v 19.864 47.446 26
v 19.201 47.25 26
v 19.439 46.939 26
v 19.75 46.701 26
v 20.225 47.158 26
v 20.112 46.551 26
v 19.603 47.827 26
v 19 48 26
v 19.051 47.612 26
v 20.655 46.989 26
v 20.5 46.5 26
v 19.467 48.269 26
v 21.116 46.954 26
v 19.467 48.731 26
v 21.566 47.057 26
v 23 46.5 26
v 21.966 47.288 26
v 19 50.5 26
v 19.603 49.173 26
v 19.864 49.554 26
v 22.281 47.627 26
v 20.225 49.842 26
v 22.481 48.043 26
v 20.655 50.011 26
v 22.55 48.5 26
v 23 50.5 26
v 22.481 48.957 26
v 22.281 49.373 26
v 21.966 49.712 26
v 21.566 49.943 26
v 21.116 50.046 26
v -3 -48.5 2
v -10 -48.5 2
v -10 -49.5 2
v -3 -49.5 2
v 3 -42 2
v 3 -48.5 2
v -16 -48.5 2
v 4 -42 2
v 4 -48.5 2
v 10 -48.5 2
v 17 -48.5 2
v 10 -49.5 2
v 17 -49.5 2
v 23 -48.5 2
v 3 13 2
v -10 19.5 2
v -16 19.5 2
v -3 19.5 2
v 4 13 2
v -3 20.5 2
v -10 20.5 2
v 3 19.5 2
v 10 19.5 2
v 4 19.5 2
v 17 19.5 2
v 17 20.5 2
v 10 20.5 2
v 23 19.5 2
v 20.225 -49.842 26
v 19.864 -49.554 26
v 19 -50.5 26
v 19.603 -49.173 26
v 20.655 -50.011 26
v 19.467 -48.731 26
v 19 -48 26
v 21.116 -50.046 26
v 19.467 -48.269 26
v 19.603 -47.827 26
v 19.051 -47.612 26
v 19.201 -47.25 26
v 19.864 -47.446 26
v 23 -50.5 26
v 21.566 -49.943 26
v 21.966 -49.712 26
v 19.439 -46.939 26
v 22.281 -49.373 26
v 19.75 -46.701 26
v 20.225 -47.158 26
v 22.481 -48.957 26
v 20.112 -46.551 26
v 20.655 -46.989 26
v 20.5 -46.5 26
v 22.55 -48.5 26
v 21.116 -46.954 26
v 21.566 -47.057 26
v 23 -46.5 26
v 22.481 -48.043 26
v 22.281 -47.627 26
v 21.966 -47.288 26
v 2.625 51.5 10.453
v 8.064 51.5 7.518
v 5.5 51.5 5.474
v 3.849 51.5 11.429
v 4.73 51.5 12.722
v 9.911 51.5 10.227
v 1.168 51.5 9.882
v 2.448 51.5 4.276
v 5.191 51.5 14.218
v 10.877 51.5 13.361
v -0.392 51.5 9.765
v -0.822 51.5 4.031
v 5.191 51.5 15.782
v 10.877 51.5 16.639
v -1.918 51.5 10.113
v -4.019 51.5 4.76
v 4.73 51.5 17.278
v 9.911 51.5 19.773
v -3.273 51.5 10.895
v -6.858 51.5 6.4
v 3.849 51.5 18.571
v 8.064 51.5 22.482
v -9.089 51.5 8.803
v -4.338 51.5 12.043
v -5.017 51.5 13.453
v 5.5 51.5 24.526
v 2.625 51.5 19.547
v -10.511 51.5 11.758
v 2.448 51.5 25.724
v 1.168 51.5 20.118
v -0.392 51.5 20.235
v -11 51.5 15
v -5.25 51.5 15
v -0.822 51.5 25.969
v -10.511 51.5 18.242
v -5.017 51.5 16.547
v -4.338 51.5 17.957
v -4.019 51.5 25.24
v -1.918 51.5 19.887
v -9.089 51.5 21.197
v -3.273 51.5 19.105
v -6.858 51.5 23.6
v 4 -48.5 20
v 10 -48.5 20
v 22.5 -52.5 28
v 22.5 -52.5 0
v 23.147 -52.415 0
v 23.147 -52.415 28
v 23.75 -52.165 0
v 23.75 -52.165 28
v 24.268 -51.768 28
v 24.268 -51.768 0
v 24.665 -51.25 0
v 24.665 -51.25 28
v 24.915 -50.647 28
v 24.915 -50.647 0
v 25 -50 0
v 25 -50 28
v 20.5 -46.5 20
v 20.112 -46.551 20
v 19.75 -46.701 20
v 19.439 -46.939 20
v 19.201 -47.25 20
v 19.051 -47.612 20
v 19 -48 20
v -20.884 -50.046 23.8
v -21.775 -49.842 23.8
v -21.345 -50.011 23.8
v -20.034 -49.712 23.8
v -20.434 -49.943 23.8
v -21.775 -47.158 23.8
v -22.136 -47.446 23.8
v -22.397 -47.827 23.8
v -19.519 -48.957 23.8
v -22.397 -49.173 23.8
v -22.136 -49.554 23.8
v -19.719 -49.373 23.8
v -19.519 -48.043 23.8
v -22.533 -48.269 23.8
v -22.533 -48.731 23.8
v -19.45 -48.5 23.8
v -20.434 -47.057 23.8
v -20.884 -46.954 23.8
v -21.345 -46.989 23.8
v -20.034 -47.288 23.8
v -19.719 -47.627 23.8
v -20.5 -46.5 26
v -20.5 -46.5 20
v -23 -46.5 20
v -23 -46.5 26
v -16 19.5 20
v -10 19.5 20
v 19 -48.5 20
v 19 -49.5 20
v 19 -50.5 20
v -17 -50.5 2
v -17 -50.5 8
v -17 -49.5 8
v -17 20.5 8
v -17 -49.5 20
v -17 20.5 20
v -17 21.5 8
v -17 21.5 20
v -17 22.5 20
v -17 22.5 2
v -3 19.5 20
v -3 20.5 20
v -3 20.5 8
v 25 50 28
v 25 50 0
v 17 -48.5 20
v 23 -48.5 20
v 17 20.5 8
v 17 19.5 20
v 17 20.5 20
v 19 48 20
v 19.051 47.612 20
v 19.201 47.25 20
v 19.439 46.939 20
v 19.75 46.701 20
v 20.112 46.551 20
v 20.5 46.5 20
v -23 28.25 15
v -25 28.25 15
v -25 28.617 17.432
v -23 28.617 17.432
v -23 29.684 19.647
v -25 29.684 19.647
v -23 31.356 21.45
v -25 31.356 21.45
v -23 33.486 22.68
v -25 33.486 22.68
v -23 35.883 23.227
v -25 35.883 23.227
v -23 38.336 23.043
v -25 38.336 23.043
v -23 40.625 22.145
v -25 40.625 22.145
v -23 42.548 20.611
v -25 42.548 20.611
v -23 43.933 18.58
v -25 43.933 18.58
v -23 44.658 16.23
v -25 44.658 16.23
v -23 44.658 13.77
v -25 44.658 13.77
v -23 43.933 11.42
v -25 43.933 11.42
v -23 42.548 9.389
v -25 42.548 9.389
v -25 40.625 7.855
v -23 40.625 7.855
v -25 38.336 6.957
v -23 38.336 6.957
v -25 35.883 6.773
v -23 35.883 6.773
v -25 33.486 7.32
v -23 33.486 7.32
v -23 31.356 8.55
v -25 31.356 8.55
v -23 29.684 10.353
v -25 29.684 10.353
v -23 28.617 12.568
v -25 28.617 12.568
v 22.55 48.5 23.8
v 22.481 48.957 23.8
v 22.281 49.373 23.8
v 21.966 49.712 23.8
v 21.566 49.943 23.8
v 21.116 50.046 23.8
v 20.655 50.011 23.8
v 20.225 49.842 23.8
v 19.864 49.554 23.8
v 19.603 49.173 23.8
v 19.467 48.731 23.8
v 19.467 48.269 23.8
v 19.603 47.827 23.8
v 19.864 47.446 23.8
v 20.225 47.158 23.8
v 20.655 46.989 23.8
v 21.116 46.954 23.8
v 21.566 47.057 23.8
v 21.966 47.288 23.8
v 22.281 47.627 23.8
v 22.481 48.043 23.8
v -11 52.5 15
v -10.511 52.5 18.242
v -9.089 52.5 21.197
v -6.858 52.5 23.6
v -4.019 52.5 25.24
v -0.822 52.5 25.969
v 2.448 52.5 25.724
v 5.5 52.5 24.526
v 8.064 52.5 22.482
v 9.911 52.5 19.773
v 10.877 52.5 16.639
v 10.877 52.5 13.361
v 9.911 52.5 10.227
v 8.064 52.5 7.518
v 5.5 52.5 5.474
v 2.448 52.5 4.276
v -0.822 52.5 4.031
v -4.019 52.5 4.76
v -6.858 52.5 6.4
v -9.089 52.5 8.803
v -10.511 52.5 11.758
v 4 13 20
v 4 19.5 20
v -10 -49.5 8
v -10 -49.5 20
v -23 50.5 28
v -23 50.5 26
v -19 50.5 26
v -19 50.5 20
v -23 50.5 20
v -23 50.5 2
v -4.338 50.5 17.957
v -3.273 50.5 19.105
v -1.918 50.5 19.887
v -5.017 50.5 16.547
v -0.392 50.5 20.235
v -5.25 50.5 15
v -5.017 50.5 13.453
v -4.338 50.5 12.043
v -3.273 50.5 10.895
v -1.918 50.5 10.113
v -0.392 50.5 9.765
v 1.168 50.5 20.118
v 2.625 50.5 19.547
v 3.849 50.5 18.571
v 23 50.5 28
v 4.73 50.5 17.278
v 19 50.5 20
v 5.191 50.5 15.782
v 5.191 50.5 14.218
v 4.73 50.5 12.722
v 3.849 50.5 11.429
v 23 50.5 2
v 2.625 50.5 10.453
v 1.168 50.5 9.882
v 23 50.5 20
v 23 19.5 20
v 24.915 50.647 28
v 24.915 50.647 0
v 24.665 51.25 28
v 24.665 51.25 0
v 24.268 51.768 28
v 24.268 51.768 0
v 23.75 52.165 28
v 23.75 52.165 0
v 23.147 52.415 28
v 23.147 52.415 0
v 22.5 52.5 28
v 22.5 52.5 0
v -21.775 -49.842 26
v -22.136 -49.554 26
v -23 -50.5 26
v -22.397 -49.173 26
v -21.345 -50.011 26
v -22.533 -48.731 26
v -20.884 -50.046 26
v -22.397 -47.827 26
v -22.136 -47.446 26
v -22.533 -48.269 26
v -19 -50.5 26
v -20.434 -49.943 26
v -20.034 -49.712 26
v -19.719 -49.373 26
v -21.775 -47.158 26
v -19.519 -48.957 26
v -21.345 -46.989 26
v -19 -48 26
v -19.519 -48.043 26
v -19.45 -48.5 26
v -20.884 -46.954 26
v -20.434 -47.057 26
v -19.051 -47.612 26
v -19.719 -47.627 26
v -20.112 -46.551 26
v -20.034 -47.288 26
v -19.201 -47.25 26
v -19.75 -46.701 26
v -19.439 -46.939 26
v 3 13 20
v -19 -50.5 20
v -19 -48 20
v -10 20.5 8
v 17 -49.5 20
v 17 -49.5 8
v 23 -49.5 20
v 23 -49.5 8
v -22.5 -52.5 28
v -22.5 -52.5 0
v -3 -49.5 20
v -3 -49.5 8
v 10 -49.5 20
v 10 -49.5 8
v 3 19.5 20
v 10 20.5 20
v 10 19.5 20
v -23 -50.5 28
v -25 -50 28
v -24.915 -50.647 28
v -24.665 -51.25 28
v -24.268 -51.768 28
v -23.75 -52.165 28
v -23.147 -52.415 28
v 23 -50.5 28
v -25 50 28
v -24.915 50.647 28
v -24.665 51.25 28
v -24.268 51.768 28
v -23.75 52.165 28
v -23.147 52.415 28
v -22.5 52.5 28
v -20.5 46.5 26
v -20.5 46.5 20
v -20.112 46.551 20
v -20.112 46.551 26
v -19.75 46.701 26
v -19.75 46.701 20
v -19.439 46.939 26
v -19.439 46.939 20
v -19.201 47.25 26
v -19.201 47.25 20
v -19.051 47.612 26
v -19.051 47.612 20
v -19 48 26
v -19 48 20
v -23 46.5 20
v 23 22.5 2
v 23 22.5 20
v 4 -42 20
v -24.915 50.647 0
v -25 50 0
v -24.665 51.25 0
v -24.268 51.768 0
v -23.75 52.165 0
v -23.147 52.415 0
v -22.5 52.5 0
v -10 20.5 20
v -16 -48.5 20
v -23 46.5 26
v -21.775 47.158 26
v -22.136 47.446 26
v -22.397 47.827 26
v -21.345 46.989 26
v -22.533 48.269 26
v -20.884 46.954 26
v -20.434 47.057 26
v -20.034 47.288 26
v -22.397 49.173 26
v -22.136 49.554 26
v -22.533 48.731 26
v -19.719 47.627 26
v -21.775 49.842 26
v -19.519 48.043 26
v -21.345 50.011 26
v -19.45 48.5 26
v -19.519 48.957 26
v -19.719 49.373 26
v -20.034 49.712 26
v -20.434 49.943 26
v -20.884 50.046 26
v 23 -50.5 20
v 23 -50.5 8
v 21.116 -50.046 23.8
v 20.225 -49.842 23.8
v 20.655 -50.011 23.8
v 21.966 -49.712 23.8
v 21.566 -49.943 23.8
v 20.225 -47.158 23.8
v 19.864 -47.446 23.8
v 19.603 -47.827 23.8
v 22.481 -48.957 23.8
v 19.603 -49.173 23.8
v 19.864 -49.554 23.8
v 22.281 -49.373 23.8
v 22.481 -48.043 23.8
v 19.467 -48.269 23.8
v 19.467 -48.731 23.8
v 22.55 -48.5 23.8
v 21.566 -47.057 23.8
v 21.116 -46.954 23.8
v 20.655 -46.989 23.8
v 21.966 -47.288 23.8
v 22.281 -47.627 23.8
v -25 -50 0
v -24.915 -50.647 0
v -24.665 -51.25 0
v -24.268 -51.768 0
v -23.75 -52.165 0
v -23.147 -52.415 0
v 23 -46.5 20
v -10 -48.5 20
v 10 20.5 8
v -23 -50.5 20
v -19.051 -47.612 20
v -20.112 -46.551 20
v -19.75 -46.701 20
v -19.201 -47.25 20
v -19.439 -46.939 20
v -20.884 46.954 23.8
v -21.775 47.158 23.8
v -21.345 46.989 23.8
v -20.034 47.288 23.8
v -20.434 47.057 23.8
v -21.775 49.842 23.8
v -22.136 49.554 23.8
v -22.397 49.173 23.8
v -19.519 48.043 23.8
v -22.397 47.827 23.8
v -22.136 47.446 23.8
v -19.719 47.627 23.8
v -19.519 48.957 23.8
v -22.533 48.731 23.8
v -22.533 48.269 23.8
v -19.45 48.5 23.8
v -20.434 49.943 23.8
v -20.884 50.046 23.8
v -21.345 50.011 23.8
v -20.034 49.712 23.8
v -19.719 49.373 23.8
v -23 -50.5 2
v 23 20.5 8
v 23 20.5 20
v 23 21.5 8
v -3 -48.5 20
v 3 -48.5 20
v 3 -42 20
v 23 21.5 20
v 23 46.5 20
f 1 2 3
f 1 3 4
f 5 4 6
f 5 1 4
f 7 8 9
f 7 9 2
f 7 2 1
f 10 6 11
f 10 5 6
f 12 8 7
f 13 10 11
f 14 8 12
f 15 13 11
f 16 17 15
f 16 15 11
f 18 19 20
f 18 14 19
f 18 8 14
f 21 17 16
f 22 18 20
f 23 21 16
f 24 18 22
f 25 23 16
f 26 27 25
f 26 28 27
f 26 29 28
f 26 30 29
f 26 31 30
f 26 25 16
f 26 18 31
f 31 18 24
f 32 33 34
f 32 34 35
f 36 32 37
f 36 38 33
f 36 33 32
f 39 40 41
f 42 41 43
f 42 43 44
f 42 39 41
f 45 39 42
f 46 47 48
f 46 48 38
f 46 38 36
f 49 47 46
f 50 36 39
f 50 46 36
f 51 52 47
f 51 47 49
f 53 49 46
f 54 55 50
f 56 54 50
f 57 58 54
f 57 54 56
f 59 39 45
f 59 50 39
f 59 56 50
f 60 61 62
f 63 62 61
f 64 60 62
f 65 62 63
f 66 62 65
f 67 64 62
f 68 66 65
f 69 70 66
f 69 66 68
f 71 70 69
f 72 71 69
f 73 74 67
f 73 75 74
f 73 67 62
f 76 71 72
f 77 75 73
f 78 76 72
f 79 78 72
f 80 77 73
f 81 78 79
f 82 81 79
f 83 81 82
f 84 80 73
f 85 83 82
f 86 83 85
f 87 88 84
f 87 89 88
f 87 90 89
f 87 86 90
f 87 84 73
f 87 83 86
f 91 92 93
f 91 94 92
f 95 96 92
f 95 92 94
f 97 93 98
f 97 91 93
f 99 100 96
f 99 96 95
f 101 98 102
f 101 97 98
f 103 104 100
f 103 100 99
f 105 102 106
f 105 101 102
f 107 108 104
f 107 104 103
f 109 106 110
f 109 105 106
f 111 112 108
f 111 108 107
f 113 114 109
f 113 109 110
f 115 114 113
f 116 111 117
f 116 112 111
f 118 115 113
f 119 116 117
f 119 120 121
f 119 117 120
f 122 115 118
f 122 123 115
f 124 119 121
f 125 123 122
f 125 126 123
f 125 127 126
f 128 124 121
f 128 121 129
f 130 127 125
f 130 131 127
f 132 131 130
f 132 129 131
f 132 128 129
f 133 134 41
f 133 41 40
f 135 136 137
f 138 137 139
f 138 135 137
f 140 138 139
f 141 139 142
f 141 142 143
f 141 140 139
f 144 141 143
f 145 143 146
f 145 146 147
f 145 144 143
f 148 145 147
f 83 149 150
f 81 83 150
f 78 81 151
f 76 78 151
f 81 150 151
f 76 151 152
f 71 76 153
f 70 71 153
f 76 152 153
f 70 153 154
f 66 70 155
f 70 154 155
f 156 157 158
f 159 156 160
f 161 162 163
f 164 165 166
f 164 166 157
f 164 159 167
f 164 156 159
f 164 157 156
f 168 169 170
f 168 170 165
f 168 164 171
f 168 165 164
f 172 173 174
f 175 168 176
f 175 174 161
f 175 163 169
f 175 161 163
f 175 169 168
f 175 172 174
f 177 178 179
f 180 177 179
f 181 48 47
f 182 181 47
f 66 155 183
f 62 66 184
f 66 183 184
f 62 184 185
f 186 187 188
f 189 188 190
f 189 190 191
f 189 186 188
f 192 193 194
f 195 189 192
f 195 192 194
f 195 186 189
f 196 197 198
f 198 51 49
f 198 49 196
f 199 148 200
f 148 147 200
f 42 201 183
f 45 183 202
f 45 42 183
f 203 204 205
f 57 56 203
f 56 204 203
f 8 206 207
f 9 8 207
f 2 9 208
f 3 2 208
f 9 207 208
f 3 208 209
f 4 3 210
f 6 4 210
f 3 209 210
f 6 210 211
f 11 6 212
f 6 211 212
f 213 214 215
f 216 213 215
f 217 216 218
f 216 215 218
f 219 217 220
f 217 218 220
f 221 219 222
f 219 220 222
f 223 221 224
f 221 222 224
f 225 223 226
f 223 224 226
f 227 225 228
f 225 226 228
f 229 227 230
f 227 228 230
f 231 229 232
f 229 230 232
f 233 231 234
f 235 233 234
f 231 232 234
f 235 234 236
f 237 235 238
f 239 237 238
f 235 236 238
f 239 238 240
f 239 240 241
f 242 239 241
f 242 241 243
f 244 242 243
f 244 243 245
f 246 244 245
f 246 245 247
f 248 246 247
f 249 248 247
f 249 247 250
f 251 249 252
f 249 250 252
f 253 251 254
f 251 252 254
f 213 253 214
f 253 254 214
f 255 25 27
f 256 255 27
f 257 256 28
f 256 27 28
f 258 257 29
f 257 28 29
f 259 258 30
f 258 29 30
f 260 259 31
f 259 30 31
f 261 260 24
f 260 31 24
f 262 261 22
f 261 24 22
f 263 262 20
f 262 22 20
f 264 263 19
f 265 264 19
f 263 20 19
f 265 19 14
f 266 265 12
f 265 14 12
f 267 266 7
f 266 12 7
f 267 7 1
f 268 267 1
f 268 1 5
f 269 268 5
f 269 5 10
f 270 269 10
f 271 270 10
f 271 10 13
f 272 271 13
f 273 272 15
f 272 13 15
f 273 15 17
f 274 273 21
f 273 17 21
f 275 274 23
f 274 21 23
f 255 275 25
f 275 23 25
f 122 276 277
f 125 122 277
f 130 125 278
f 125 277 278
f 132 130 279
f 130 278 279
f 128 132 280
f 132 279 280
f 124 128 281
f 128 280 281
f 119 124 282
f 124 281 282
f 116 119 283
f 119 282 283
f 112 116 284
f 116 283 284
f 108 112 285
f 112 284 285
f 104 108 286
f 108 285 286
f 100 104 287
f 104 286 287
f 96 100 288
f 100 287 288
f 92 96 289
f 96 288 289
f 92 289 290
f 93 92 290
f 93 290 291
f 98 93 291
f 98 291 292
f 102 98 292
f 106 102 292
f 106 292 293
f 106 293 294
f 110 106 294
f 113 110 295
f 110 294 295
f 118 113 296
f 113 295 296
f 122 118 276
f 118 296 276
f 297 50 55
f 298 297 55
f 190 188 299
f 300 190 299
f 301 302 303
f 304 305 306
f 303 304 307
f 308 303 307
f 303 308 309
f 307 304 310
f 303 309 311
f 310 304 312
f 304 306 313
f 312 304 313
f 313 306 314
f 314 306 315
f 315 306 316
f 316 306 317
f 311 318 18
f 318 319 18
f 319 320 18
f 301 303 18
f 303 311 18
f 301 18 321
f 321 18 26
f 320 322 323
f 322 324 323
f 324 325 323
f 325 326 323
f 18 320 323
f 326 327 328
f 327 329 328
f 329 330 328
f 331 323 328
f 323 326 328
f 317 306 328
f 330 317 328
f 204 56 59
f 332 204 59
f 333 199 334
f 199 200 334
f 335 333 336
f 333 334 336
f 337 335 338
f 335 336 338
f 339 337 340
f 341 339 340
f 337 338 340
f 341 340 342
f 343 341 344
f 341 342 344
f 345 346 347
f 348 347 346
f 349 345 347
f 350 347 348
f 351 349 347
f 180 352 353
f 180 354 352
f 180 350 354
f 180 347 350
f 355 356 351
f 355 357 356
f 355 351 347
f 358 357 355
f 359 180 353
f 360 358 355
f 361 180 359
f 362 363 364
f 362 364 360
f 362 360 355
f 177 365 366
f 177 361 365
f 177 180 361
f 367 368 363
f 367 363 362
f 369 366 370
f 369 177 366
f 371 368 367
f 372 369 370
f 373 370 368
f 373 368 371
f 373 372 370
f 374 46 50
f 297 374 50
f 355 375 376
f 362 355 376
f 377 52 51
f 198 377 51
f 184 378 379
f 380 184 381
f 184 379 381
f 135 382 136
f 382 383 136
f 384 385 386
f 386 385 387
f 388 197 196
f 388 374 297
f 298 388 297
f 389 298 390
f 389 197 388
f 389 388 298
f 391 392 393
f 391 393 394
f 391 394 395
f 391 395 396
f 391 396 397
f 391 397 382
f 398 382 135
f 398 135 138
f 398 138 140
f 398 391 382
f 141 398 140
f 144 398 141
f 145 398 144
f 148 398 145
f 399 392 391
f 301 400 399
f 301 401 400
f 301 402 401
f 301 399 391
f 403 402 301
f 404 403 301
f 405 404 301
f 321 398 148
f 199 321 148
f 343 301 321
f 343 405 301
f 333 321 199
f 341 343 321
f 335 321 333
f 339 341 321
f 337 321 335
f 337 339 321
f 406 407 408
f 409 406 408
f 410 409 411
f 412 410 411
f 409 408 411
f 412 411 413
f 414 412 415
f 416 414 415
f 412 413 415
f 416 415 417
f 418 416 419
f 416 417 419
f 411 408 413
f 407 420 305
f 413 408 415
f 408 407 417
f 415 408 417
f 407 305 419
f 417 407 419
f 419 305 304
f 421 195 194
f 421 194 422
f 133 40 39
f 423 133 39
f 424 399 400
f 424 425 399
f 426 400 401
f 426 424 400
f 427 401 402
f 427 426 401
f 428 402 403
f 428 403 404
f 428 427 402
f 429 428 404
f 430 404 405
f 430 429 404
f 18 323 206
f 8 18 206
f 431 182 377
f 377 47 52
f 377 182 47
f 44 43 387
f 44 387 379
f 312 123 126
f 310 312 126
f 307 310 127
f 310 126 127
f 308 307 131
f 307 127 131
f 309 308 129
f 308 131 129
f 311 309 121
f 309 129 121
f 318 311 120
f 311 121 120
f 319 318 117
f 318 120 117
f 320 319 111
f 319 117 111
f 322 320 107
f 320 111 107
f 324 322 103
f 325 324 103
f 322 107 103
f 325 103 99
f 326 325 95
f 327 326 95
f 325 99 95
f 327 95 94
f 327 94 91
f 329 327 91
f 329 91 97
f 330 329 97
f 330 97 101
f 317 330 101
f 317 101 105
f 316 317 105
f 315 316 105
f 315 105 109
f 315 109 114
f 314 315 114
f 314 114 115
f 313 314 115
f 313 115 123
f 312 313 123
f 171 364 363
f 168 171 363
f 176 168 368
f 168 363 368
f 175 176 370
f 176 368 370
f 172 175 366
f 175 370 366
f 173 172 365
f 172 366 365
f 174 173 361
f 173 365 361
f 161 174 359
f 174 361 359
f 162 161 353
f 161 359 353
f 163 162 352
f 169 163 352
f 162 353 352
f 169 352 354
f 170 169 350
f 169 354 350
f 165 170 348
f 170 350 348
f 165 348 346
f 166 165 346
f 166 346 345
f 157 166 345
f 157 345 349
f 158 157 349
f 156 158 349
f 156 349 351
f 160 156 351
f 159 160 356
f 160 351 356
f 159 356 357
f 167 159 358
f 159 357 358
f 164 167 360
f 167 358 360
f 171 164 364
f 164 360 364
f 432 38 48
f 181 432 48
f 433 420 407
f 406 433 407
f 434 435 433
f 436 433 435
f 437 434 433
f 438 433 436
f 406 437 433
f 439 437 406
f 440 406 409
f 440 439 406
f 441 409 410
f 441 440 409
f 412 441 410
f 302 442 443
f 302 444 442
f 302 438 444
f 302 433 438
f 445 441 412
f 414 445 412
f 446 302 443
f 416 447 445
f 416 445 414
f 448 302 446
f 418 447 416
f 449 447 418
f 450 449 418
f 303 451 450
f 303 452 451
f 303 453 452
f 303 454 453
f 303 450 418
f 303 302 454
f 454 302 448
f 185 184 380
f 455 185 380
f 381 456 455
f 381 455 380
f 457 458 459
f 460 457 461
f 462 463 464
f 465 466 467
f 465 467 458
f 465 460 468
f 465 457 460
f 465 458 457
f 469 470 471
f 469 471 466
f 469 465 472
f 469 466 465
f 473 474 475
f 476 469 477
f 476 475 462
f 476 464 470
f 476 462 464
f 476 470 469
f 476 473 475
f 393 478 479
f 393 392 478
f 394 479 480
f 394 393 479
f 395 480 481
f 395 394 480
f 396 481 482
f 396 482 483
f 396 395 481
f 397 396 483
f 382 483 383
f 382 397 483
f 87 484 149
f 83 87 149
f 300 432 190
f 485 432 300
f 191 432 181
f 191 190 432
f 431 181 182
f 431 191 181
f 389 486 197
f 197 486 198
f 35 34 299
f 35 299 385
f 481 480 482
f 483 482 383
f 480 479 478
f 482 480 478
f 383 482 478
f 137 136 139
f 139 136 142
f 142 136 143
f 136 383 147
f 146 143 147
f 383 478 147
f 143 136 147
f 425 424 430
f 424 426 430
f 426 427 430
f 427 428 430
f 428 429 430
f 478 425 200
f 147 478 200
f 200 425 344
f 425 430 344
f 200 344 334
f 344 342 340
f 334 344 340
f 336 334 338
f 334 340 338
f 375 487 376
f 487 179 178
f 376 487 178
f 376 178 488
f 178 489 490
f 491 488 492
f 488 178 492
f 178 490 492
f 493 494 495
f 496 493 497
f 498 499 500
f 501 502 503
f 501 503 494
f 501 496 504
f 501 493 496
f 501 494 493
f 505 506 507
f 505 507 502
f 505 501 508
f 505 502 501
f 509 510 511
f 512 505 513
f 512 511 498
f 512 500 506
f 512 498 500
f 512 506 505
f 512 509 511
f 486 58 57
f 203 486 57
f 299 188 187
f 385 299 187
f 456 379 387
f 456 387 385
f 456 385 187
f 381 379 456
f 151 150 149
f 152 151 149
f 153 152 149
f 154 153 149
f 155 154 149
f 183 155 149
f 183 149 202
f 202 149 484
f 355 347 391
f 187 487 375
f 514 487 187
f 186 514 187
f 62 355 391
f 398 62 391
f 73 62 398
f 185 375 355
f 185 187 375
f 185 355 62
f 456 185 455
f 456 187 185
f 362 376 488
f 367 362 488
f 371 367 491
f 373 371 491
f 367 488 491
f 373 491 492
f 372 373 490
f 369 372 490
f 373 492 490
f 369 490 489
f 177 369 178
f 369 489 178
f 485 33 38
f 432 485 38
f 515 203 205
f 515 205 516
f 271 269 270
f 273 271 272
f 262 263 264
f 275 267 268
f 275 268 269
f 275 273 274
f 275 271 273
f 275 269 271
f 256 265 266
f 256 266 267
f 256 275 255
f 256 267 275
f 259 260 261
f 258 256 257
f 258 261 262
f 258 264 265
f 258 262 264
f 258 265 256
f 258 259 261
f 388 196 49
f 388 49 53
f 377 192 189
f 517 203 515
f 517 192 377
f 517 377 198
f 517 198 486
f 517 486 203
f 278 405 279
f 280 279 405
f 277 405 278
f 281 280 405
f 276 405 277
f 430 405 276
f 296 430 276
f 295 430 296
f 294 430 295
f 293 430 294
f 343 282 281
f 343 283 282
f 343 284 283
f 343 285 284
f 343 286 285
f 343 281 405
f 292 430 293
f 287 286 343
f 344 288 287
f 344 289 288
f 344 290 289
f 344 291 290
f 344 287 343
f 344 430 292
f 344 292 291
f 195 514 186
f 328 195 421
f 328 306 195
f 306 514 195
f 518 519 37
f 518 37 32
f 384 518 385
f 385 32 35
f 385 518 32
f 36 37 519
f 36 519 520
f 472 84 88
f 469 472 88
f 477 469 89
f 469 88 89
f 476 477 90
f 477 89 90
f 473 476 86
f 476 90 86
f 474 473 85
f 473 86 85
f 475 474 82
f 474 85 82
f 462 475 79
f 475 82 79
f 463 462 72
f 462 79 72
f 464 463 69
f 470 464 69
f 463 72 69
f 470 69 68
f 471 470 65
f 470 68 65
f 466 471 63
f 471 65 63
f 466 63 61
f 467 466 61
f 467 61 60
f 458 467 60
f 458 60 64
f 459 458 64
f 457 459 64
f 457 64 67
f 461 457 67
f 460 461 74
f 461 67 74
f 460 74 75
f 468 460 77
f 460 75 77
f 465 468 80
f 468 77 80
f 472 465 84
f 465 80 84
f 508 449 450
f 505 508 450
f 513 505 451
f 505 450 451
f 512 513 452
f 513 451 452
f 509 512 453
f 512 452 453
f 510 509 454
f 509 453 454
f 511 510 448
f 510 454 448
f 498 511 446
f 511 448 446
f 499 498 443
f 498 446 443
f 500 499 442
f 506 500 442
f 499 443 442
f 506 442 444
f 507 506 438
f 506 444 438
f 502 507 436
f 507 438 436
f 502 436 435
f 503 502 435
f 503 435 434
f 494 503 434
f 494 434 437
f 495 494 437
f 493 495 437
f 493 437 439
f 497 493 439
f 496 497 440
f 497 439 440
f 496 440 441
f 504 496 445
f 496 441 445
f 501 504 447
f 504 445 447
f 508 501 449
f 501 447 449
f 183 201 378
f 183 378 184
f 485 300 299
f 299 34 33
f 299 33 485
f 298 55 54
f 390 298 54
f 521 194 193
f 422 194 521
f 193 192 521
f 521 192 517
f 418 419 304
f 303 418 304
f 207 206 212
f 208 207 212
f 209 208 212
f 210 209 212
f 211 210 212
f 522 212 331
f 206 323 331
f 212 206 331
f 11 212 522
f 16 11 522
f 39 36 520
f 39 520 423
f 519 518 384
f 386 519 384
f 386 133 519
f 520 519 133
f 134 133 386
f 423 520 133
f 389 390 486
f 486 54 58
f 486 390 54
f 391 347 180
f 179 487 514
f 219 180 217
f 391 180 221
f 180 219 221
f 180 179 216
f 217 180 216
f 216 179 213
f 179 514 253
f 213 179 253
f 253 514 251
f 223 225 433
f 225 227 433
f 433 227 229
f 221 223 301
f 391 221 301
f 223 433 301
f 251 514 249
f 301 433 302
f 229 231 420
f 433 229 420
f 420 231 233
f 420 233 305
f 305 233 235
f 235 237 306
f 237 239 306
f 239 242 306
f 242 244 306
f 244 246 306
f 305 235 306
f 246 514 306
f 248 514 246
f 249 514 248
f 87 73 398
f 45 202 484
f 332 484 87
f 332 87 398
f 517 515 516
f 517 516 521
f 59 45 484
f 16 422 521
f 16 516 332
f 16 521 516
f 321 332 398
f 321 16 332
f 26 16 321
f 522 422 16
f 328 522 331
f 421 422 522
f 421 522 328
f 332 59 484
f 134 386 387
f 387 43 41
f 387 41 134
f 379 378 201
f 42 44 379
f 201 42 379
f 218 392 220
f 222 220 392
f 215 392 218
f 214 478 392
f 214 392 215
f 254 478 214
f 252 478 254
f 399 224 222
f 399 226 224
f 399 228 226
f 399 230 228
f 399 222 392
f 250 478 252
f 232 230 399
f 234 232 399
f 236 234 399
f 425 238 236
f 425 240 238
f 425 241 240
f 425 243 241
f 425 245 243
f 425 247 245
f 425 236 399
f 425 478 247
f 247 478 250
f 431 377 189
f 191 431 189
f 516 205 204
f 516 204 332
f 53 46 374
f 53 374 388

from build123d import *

# Parameters (mm, degrees)
F3_W      = 50
F3_H      = 105
F4_DEPTH  = 2
F5_W      = 50
F5_H      = 105
F5_W_2    = 46
F5_H_2    = 101
F6_DEPTH  = 26
F7_R      = 2.5
F8_R      = 8.25
F9_DEPTH  = 2
F10_R     = 5.25
F11_DEPTH = 2
F13_W     = 6
F13_H     = 1
F13_W_2   = 1
F13_H_2   = 6.5
F13_H_3   = 68
F13_W_3   = 40
F14_DEPTH = 18
F15_W     = 40
F15_H     = 1
F16_DEPTH = 6
F18_DEPTH = 6
F19_R     = 1.55
F20_DEPTH = 2.2
F12_R     = 11
F21_DEPTH = 1


with BuildPart() as f4:
    # F3 (on Top) → F4 (new body)
    with BuildSketch(Plane.XY):
        Rectangle(F3_W, F3_H)
    extrude(amount=F4_DEPTH)

    # F5 (on face) → F6 (join)
    with BuildSketch(Plane.XY.offset(2)):
        Rectangle(F5_W, F5_H)
        Rectangle(F5_W_2, F5_H_2, mode=Mode.SUBTRACT)
    extrude(amount=F6_DEPTH)

    # F7
    f7_edges = [f4.edges().sort_by_distance(p)[0] for p in [
        (-25, 52.5, 14),
        (25, 52.5, 14),
        (25, -52.5, 14),
        (-25, -52.5, 14),
    ]]
    fillet(f7_edges, radius=F7_R)

    # F8 (on face) → F9 (cut)
    with BuildSketch(Plane(origin=(-25, 0, 0), x_dir=(0, -1, 0), z_dir=(-1, 0, 0))):
        with Locations((-36.5, 15)):
            Circle(F8_R)
    extrude(amount=-F9_DEPTH, mode=Mode.SUBTRACT)

    # F10 (on face) → F11 (cut)
    with BuildSketch(Plane(origin=(0, 52.5, 0), x_dir=(-1, 0, 0), z_dir=(0, 1, 0))):
        with Locations((0, 15)):
            Circle(F10_R)
    extrude(amount=-F11_DEPTH, mode=Mode.SUBTRACT)

    # F13 (on face) → F14 (join)
    with BuildSketch(Plane.XY.offset(2)):
        with Locations((20, 20)):
            Rectangle(F13_W, F13_H)
        with Locations((20, -49)):
            Rectangle(F13_W, F13_H)
        Polygon((10, 20.5), (-3, 20.5), (-3, 19.5), (3, 19.5), (4, 19.5), (10, 19.5), align=None)
        with Locations((3.5, 16.25)):
            Rectangle(F13_W_2, F13_H_2)
        Polygon((-3, -48.5), (-3, -49.5), (10, -49.5), (10, -48.5), (4, -48.5), (3, -48.5), align=None)
        with Locations((3.5, -45.25)):
            Rectangle(F13_W_2, F13_H_2)
        Polygon((-10, 19.5), (-10, 20.5), (-17, 20.5), (-17, 19.5), (-16, 19.5), align=None)
        with Locations((-16.5, -14.5)):
            Rectangle(F13_W_2, F13_H_3)
        Polygon((-16, -48.5), (-17, -48.5), (-17, -49.5), (-10, -49.5), (-10, -48.5), align=None)
        with Locations((3, 22)):
            Rectangle(F13_W_3, F13_H)
    extrude(amount=F14_DEPTH)

    # F15 (on face) → F16 (join)
    with BuildSketch(Plane.XY.offset(2)):
        with Locations((3, 21)):
            Rectangle(F15_W, F15_H)
        with Locations((3, -50)):
            Rectangle(F15_W, F15_H)
    extrude(amount=F16_DEPTH)

    # F17 (on face) → F18 (join)
    with BuildSketch(Plane.XY.offset(20)):
        with BuildLine():
            Line((-23, 46.5), (-20.5, 46.5))
            ThreePointArc((-20.5, 46.5), (-19.4393398282, 46.9393398282), (-19, 48))
            Line((-19, 48), (-19, 50.5))
            Line((-19, 50.5), (-23, 50.5))
            Line((-23, 50.5), (-23, 46.5))
        make_face()
        with BuildLine():
            ThreePointArc((19, 48), (19.4393398282, 46.9393398282), (20.5, 46.5))
            Line((20.5, 46.5), (23, 46.5))
            Line((23, 46.5), (23, 50.5))
            Line((23, 50.5), (19, 50.5))
            Line((19, 50.5), (19, 48))
        make_face()
        with BuildLine():
            ThreePointArc((20.5, -46.5), (19.4393398282, -46.9393398282), (19, -48))
            Line((19, -48), (19, -50.5))
            Line((19, -50.5), (23, -50.5))
            Line((23, -50.5), (23, -46.5))
            Line((23, -46.5), (20.5, -46.5))
        make_face()
        with BuildLine():
            ThreePointArc((-19, -48), (-19.4393398282, -46.9393398282), (-20.5, -46.5))
            Line((-20.5, -46.5), (-23, -46.5))
            Line((-23, -46.5), (-23, -50.5))
            Line((-23, -50.5), (-19, -50.5))
            Line((-19, -50.5), (-19, -48))
        make_face()
    extrude(amount=F18_DEPTH)

    # F19 (on face) → F20 (cut)
    with BuildSketch(Plane.XY.offset(26)):
        with Locations((-21, 48.5)):
            Circle(F19_R)
        with Locations((21, 48.5)):
            Circle(F19_R)
        with Locations((-21, -48.5)):
            Circle(F19_R)
        with Locations((21, -48.5)):
            Circle(F19_R)
    extrude(amount=-F20_DEPTH, mode=Mode.SUBTRACT)

    # F12 (on face) → F21 (cut)
    with BuildSketch(Plane(origin=(0, 52.5, 0), x_dir=(-1, 0, 0), z_dir=(0, 1, 0))):
        with Locations((0, 15)):
            Circle(F12_R)
    extrude(amount=-F21_DEPTH, mode=Mode.SUBTRACT)


solid = f4.part
